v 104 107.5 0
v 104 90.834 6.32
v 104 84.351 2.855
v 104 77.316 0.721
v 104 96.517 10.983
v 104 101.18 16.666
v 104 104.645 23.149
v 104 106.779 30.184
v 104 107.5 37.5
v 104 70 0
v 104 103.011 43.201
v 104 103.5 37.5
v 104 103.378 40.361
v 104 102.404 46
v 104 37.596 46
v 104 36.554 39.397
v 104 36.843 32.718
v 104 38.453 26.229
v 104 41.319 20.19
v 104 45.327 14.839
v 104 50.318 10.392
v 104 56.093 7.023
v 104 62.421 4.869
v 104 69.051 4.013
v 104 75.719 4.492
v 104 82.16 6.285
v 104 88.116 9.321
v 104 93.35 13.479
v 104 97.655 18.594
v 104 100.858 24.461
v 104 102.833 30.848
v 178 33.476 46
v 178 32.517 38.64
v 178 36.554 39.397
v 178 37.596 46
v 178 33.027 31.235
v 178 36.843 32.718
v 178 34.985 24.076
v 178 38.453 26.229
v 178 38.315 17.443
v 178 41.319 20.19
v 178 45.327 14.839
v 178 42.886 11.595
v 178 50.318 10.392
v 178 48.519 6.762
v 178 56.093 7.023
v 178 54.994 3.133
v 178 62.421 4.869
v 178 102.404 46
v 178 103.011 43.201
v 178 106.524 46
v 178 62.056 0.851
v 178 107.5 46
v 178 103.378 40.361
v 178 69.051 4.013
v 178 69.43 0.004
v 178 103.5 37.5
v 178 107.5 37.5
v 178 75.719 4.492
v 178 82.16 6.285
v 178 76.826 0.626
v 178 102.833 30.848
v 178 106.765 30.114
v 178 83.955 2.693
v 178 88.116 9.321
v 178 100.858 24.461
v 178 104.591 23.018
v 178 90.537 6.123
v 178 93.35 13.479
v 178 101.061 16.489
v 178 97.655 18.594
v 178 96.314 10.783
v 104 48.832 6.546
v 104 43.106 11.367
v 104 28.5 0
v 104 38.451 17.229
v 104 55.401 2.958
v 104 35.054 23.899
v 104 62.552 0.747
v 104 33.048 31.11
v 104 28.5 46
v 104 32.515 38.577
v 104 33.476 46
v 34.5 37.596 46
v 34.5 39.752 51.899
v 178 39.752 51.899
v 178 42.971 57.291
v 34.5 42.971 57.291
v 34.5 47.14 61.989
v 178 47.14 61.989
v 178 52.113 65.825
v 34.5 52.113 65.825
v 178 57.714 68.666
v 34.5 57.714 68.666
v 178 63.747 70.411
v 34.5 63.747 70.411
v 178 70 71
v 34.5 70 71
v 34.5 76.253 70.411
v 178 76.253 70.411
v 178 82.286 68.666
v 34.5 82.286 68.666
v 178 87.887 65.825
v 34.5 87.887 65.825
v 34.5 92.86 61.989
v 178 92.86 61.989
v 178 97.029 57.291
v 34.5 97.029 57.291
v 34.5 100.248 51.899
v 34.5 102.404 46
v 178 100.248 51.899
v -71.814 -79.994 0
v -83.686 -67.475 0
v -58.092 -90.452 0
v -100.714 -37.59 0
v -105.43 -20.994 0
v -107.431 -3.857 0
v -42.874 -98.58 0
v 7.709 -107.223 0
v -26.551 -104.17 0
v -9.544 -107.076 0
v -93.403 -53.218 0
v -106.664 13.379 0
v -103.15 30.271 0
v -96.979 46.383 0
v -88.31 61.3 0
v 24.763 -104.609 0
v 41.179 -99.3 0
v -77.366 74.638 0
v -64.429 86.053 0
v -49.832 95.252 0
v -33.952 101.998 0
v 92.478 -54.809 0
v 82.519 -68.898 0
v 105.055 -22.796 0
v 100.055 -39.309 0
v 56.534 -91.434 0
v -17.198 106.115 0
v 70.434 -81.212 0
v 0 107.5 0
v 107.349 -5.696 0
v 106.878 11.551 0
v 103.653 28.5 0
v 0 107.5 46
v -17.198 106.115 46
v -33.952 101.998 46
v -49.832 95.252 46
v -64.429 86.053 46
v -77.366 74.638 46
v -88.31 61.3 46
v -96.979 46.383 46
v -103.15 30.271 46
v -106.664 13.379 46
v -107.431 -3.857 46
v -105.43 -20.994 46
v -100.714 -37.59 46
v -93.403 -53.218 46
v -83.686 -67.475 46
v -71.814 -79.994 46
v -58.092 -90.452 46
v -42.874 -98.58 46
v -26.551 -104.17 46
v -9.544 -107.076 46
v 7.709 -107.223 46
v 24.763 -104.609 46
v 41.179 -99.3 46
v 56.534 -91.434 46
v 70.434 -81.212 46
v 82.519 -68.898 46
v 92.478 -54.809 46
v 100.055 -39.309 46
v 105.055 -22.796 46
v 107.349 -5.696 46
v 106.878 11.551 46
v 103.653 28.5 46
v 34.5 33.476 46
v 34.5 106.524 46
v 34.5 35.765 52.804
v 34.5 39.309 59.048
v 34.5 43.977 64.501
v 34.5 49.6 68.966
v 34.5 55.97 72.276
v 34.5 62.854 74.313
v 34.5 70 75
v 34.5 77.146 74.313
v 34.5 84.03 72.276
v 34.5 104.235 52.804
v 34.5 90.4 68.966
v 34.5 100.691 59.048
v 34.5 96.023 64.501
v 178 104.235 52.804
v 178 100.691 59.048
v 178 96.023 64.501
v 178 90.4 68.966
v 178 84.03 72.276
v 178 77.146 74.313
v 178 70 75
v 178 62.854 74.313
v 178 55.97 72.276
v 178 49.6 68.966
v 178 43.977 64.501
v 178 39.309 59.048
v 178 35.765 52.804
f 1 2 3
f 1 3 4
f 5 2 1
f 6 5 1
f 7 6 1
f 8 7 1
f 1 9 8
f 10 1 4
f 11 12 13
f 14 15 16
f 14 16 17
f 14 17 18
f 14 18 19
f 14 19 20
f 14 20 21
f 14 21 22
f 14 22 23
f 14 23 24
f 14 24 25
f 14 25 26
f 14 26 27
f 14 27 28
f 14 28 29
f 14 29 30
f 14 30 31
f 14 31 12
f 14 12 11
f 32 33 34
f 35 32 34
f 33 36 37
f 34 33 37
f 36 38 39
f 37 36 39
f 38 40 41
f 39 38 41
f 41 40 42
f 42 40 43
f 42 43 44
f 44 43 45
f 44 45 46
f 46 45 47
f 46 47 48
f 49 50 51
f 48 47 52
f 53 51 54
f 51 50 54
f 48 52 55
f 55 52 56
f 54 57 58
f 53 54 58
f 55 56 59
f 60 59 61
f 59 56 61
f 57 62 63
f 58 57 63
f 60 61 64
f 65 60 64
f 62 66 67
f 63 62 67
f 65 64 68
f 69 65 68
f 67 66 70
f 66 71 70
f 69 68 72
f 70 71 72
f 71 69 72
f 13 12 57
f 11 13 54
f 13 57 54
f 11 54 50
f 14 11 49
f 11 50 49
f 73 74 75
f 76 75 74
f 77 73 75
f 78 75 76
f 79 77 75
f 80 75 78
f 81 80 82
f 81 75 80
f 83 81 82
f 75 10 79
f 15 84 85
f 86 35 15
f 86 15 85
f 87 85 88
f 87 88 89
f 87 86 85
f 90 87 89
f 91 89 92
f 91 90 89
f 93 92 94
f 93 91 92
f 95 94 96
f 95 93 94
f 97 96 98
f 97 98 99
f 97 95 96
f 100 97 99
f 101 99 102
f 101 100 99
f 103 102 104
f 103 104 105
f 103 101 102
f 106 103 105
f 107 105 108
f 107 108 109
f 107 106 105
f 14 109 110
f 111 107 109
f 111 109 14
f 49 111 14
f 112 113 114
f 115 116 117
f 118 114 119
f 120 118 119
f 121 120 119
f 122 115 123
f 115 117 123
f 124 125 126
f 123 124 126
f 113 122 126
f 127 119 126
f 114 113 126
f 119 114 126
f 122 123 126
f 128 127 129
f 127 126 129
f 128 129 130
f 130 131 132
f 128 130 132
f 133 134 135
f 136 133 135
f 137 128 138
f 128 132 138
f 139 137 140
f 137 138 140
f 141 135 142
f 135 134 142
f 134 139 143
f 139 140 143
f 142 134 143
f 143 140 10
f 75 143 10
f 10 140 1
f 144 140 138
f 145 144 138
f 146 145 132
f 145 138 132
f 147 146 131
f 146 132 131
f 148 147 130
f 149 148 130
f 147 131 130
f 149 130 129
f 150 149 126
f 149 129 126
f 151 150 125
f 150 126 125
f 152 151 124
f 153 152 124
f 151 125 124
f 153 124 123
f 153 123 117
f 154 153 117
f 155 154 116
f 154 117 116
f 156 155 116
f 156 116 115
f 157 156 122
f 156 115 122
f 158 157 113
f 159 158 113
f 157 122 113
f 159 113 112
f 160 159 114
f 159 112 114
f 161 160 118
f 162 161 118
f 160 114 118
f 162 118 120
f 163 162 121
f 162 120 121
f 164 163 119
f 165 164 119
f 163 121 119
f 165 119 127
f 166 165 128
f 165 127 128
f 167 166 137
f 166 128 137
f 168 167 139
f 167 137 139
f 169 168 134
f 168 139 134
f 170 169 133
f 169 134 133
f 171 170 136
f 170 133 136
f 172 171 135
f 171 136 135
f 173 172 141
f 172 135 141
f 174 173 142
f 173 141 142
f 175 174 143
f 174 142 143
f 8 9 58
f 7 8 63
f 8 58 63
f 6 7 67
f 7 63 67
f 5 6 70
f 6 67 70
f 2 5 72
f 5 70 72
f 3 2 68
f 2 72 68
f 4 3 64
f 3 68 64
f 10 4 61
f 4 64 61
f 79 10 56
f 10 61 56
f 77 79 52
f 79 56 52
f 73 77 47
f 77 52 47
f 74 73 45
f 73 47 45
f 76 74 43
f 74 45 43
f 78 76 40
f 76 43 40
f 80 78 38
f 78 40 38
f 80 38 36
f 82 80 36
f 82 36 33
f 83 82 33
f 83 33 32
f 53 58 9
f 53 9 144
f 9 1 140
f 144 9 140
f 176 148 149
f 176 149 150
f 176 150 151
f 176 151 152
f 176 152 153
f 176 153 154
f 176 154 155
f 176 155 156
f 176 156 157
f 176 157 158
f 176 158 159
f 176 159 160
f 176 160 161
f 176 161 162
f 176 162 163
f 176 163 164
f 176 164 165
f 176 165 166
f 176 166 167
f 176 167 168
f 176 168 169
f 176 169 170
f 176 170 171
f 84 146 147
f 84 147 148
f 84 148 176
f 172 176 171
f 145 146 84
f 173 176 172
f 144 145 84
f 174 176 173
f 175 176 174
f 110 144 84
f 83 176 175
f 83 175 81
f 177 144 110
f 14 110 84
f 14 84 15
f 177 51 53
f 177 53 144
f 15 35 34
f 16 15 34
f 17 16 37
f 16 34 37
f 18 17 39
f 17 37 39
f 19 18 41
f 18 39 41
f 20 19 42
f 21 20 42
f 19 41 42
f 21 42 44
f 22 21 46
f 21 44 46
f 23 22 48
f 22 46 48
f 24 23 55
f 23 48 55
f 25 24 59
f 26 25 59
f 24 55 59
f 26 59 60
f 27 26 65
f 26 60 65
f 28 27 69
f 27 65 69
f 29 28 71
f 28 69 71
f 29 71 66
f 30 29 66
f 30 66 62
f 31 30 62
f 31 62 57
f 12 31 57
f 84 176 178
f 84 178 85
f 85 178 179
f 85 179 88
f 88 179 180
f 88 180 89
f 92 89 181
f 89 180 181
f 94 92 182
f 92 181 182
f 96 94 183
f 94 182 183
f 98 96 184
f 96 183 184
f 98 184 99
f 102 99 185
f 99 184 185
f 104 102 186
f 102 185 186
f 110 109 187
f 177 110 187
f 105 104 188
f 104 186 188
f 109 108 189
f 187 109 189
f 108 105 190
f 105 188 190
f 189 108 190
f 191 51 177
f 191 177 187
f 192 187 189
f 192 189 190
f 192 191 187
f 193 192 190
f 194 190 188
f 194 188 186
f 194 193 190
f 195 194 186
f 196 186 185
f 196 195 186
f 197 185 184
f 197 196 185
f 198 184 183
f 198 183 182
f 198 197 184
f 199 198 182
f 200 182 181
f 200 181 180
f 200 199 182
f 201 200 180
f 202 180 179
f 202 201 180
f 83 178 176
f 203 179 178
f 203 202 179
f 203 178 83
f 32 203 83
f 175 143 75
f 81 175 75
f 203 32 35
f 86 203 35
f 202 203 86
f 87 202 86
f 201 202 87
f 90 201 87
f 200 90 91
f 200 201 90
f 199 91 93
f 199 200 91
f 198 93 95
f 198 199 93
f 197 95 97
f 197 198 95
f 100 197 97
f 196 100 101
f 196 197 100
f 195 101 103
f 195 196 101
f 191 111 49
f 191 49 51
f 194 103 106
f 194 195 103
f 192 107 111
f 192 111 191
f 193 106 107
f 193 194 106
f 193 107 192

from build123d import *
from build123d import SkipClean  # not in build123d's __all__

# Parameters (mm, degrees)
F1_DEPTH = 46
F3_DEPTH = 74
F4_DEPTH = 143.5


with BuildPart() as f1:
    # F0 (on Top) → F1 (new body)
    with BuildSketch(Plane.XY):
        with BuildLine():
            Line((178, 107.5), (0, 107.5))
            ThreePointArc((0, 107.5), (-65.1632565178, -85.4985379992), (103.6532681588, 28.5))
            Line((103.6532681588, 28.5), (178, 28.5))
            Line((178, 28.5), (178, 107.5))
        make_face()
    extrude(amount=F1_DEPTH)

    # F2 (on face) → F3 (cut)
    with BuildSketch(Plane.YZ.offset(178)):
        with BuildLine():
            ThreePointArc((70, 0), (40.6316496888, 14.1815523673), (33.4760352645, 46))
            Line((33.4760352645, 46), (28.5, 46))
            Line((28.5, 46), (28.5, 0))
            Line((28.5, 0), (70, 0))
        make_face()
        with BuildLine():
            Line((107.5, 0), (107.5, 37.5))
            ThreePointArc((107.5, 37.5), (96.5165042945, 10.9834957055), (70, 0))
            Line((70, 0), (107.5, 0))
        make_face()
        with BuildLine():
            ThreePointArc((37.596296508, 46), (65.714796795, 4.275204538), (103.5, 37.5))
            ThreePointArc((103.5, 37.5), (103.224795462, 41.785203205), (102.403703492, 46))
            Line((102.403703492, 46), (37.596296508, 46))
        make_face()
    extrude(amount=-F3_DEPTH, mode=Mode.SUBTRACT)

    # F2 (on face) → F4 (join)
    with BuildSketch(Plane.YZ.offset(178)):
        with BuildLine():
            ThreePointArc((37.596296508, 46), (70, 71), (102.403703492, 46))
            Line((102.403703492, 46), (106.5239647355, 46))
            ThreePointArc((106.5239647355, 46), (70, 75), (33.4760352645, 46))
            Line((33.4760352645, 46), (37.596296508, 46))
        make_face()
    with SkipClean():  # cleaning this boolean's faces spoils the solid; the shape is the same uncleaned
        extrude(amount=-F4_DEPTH)


solid = f1.part
